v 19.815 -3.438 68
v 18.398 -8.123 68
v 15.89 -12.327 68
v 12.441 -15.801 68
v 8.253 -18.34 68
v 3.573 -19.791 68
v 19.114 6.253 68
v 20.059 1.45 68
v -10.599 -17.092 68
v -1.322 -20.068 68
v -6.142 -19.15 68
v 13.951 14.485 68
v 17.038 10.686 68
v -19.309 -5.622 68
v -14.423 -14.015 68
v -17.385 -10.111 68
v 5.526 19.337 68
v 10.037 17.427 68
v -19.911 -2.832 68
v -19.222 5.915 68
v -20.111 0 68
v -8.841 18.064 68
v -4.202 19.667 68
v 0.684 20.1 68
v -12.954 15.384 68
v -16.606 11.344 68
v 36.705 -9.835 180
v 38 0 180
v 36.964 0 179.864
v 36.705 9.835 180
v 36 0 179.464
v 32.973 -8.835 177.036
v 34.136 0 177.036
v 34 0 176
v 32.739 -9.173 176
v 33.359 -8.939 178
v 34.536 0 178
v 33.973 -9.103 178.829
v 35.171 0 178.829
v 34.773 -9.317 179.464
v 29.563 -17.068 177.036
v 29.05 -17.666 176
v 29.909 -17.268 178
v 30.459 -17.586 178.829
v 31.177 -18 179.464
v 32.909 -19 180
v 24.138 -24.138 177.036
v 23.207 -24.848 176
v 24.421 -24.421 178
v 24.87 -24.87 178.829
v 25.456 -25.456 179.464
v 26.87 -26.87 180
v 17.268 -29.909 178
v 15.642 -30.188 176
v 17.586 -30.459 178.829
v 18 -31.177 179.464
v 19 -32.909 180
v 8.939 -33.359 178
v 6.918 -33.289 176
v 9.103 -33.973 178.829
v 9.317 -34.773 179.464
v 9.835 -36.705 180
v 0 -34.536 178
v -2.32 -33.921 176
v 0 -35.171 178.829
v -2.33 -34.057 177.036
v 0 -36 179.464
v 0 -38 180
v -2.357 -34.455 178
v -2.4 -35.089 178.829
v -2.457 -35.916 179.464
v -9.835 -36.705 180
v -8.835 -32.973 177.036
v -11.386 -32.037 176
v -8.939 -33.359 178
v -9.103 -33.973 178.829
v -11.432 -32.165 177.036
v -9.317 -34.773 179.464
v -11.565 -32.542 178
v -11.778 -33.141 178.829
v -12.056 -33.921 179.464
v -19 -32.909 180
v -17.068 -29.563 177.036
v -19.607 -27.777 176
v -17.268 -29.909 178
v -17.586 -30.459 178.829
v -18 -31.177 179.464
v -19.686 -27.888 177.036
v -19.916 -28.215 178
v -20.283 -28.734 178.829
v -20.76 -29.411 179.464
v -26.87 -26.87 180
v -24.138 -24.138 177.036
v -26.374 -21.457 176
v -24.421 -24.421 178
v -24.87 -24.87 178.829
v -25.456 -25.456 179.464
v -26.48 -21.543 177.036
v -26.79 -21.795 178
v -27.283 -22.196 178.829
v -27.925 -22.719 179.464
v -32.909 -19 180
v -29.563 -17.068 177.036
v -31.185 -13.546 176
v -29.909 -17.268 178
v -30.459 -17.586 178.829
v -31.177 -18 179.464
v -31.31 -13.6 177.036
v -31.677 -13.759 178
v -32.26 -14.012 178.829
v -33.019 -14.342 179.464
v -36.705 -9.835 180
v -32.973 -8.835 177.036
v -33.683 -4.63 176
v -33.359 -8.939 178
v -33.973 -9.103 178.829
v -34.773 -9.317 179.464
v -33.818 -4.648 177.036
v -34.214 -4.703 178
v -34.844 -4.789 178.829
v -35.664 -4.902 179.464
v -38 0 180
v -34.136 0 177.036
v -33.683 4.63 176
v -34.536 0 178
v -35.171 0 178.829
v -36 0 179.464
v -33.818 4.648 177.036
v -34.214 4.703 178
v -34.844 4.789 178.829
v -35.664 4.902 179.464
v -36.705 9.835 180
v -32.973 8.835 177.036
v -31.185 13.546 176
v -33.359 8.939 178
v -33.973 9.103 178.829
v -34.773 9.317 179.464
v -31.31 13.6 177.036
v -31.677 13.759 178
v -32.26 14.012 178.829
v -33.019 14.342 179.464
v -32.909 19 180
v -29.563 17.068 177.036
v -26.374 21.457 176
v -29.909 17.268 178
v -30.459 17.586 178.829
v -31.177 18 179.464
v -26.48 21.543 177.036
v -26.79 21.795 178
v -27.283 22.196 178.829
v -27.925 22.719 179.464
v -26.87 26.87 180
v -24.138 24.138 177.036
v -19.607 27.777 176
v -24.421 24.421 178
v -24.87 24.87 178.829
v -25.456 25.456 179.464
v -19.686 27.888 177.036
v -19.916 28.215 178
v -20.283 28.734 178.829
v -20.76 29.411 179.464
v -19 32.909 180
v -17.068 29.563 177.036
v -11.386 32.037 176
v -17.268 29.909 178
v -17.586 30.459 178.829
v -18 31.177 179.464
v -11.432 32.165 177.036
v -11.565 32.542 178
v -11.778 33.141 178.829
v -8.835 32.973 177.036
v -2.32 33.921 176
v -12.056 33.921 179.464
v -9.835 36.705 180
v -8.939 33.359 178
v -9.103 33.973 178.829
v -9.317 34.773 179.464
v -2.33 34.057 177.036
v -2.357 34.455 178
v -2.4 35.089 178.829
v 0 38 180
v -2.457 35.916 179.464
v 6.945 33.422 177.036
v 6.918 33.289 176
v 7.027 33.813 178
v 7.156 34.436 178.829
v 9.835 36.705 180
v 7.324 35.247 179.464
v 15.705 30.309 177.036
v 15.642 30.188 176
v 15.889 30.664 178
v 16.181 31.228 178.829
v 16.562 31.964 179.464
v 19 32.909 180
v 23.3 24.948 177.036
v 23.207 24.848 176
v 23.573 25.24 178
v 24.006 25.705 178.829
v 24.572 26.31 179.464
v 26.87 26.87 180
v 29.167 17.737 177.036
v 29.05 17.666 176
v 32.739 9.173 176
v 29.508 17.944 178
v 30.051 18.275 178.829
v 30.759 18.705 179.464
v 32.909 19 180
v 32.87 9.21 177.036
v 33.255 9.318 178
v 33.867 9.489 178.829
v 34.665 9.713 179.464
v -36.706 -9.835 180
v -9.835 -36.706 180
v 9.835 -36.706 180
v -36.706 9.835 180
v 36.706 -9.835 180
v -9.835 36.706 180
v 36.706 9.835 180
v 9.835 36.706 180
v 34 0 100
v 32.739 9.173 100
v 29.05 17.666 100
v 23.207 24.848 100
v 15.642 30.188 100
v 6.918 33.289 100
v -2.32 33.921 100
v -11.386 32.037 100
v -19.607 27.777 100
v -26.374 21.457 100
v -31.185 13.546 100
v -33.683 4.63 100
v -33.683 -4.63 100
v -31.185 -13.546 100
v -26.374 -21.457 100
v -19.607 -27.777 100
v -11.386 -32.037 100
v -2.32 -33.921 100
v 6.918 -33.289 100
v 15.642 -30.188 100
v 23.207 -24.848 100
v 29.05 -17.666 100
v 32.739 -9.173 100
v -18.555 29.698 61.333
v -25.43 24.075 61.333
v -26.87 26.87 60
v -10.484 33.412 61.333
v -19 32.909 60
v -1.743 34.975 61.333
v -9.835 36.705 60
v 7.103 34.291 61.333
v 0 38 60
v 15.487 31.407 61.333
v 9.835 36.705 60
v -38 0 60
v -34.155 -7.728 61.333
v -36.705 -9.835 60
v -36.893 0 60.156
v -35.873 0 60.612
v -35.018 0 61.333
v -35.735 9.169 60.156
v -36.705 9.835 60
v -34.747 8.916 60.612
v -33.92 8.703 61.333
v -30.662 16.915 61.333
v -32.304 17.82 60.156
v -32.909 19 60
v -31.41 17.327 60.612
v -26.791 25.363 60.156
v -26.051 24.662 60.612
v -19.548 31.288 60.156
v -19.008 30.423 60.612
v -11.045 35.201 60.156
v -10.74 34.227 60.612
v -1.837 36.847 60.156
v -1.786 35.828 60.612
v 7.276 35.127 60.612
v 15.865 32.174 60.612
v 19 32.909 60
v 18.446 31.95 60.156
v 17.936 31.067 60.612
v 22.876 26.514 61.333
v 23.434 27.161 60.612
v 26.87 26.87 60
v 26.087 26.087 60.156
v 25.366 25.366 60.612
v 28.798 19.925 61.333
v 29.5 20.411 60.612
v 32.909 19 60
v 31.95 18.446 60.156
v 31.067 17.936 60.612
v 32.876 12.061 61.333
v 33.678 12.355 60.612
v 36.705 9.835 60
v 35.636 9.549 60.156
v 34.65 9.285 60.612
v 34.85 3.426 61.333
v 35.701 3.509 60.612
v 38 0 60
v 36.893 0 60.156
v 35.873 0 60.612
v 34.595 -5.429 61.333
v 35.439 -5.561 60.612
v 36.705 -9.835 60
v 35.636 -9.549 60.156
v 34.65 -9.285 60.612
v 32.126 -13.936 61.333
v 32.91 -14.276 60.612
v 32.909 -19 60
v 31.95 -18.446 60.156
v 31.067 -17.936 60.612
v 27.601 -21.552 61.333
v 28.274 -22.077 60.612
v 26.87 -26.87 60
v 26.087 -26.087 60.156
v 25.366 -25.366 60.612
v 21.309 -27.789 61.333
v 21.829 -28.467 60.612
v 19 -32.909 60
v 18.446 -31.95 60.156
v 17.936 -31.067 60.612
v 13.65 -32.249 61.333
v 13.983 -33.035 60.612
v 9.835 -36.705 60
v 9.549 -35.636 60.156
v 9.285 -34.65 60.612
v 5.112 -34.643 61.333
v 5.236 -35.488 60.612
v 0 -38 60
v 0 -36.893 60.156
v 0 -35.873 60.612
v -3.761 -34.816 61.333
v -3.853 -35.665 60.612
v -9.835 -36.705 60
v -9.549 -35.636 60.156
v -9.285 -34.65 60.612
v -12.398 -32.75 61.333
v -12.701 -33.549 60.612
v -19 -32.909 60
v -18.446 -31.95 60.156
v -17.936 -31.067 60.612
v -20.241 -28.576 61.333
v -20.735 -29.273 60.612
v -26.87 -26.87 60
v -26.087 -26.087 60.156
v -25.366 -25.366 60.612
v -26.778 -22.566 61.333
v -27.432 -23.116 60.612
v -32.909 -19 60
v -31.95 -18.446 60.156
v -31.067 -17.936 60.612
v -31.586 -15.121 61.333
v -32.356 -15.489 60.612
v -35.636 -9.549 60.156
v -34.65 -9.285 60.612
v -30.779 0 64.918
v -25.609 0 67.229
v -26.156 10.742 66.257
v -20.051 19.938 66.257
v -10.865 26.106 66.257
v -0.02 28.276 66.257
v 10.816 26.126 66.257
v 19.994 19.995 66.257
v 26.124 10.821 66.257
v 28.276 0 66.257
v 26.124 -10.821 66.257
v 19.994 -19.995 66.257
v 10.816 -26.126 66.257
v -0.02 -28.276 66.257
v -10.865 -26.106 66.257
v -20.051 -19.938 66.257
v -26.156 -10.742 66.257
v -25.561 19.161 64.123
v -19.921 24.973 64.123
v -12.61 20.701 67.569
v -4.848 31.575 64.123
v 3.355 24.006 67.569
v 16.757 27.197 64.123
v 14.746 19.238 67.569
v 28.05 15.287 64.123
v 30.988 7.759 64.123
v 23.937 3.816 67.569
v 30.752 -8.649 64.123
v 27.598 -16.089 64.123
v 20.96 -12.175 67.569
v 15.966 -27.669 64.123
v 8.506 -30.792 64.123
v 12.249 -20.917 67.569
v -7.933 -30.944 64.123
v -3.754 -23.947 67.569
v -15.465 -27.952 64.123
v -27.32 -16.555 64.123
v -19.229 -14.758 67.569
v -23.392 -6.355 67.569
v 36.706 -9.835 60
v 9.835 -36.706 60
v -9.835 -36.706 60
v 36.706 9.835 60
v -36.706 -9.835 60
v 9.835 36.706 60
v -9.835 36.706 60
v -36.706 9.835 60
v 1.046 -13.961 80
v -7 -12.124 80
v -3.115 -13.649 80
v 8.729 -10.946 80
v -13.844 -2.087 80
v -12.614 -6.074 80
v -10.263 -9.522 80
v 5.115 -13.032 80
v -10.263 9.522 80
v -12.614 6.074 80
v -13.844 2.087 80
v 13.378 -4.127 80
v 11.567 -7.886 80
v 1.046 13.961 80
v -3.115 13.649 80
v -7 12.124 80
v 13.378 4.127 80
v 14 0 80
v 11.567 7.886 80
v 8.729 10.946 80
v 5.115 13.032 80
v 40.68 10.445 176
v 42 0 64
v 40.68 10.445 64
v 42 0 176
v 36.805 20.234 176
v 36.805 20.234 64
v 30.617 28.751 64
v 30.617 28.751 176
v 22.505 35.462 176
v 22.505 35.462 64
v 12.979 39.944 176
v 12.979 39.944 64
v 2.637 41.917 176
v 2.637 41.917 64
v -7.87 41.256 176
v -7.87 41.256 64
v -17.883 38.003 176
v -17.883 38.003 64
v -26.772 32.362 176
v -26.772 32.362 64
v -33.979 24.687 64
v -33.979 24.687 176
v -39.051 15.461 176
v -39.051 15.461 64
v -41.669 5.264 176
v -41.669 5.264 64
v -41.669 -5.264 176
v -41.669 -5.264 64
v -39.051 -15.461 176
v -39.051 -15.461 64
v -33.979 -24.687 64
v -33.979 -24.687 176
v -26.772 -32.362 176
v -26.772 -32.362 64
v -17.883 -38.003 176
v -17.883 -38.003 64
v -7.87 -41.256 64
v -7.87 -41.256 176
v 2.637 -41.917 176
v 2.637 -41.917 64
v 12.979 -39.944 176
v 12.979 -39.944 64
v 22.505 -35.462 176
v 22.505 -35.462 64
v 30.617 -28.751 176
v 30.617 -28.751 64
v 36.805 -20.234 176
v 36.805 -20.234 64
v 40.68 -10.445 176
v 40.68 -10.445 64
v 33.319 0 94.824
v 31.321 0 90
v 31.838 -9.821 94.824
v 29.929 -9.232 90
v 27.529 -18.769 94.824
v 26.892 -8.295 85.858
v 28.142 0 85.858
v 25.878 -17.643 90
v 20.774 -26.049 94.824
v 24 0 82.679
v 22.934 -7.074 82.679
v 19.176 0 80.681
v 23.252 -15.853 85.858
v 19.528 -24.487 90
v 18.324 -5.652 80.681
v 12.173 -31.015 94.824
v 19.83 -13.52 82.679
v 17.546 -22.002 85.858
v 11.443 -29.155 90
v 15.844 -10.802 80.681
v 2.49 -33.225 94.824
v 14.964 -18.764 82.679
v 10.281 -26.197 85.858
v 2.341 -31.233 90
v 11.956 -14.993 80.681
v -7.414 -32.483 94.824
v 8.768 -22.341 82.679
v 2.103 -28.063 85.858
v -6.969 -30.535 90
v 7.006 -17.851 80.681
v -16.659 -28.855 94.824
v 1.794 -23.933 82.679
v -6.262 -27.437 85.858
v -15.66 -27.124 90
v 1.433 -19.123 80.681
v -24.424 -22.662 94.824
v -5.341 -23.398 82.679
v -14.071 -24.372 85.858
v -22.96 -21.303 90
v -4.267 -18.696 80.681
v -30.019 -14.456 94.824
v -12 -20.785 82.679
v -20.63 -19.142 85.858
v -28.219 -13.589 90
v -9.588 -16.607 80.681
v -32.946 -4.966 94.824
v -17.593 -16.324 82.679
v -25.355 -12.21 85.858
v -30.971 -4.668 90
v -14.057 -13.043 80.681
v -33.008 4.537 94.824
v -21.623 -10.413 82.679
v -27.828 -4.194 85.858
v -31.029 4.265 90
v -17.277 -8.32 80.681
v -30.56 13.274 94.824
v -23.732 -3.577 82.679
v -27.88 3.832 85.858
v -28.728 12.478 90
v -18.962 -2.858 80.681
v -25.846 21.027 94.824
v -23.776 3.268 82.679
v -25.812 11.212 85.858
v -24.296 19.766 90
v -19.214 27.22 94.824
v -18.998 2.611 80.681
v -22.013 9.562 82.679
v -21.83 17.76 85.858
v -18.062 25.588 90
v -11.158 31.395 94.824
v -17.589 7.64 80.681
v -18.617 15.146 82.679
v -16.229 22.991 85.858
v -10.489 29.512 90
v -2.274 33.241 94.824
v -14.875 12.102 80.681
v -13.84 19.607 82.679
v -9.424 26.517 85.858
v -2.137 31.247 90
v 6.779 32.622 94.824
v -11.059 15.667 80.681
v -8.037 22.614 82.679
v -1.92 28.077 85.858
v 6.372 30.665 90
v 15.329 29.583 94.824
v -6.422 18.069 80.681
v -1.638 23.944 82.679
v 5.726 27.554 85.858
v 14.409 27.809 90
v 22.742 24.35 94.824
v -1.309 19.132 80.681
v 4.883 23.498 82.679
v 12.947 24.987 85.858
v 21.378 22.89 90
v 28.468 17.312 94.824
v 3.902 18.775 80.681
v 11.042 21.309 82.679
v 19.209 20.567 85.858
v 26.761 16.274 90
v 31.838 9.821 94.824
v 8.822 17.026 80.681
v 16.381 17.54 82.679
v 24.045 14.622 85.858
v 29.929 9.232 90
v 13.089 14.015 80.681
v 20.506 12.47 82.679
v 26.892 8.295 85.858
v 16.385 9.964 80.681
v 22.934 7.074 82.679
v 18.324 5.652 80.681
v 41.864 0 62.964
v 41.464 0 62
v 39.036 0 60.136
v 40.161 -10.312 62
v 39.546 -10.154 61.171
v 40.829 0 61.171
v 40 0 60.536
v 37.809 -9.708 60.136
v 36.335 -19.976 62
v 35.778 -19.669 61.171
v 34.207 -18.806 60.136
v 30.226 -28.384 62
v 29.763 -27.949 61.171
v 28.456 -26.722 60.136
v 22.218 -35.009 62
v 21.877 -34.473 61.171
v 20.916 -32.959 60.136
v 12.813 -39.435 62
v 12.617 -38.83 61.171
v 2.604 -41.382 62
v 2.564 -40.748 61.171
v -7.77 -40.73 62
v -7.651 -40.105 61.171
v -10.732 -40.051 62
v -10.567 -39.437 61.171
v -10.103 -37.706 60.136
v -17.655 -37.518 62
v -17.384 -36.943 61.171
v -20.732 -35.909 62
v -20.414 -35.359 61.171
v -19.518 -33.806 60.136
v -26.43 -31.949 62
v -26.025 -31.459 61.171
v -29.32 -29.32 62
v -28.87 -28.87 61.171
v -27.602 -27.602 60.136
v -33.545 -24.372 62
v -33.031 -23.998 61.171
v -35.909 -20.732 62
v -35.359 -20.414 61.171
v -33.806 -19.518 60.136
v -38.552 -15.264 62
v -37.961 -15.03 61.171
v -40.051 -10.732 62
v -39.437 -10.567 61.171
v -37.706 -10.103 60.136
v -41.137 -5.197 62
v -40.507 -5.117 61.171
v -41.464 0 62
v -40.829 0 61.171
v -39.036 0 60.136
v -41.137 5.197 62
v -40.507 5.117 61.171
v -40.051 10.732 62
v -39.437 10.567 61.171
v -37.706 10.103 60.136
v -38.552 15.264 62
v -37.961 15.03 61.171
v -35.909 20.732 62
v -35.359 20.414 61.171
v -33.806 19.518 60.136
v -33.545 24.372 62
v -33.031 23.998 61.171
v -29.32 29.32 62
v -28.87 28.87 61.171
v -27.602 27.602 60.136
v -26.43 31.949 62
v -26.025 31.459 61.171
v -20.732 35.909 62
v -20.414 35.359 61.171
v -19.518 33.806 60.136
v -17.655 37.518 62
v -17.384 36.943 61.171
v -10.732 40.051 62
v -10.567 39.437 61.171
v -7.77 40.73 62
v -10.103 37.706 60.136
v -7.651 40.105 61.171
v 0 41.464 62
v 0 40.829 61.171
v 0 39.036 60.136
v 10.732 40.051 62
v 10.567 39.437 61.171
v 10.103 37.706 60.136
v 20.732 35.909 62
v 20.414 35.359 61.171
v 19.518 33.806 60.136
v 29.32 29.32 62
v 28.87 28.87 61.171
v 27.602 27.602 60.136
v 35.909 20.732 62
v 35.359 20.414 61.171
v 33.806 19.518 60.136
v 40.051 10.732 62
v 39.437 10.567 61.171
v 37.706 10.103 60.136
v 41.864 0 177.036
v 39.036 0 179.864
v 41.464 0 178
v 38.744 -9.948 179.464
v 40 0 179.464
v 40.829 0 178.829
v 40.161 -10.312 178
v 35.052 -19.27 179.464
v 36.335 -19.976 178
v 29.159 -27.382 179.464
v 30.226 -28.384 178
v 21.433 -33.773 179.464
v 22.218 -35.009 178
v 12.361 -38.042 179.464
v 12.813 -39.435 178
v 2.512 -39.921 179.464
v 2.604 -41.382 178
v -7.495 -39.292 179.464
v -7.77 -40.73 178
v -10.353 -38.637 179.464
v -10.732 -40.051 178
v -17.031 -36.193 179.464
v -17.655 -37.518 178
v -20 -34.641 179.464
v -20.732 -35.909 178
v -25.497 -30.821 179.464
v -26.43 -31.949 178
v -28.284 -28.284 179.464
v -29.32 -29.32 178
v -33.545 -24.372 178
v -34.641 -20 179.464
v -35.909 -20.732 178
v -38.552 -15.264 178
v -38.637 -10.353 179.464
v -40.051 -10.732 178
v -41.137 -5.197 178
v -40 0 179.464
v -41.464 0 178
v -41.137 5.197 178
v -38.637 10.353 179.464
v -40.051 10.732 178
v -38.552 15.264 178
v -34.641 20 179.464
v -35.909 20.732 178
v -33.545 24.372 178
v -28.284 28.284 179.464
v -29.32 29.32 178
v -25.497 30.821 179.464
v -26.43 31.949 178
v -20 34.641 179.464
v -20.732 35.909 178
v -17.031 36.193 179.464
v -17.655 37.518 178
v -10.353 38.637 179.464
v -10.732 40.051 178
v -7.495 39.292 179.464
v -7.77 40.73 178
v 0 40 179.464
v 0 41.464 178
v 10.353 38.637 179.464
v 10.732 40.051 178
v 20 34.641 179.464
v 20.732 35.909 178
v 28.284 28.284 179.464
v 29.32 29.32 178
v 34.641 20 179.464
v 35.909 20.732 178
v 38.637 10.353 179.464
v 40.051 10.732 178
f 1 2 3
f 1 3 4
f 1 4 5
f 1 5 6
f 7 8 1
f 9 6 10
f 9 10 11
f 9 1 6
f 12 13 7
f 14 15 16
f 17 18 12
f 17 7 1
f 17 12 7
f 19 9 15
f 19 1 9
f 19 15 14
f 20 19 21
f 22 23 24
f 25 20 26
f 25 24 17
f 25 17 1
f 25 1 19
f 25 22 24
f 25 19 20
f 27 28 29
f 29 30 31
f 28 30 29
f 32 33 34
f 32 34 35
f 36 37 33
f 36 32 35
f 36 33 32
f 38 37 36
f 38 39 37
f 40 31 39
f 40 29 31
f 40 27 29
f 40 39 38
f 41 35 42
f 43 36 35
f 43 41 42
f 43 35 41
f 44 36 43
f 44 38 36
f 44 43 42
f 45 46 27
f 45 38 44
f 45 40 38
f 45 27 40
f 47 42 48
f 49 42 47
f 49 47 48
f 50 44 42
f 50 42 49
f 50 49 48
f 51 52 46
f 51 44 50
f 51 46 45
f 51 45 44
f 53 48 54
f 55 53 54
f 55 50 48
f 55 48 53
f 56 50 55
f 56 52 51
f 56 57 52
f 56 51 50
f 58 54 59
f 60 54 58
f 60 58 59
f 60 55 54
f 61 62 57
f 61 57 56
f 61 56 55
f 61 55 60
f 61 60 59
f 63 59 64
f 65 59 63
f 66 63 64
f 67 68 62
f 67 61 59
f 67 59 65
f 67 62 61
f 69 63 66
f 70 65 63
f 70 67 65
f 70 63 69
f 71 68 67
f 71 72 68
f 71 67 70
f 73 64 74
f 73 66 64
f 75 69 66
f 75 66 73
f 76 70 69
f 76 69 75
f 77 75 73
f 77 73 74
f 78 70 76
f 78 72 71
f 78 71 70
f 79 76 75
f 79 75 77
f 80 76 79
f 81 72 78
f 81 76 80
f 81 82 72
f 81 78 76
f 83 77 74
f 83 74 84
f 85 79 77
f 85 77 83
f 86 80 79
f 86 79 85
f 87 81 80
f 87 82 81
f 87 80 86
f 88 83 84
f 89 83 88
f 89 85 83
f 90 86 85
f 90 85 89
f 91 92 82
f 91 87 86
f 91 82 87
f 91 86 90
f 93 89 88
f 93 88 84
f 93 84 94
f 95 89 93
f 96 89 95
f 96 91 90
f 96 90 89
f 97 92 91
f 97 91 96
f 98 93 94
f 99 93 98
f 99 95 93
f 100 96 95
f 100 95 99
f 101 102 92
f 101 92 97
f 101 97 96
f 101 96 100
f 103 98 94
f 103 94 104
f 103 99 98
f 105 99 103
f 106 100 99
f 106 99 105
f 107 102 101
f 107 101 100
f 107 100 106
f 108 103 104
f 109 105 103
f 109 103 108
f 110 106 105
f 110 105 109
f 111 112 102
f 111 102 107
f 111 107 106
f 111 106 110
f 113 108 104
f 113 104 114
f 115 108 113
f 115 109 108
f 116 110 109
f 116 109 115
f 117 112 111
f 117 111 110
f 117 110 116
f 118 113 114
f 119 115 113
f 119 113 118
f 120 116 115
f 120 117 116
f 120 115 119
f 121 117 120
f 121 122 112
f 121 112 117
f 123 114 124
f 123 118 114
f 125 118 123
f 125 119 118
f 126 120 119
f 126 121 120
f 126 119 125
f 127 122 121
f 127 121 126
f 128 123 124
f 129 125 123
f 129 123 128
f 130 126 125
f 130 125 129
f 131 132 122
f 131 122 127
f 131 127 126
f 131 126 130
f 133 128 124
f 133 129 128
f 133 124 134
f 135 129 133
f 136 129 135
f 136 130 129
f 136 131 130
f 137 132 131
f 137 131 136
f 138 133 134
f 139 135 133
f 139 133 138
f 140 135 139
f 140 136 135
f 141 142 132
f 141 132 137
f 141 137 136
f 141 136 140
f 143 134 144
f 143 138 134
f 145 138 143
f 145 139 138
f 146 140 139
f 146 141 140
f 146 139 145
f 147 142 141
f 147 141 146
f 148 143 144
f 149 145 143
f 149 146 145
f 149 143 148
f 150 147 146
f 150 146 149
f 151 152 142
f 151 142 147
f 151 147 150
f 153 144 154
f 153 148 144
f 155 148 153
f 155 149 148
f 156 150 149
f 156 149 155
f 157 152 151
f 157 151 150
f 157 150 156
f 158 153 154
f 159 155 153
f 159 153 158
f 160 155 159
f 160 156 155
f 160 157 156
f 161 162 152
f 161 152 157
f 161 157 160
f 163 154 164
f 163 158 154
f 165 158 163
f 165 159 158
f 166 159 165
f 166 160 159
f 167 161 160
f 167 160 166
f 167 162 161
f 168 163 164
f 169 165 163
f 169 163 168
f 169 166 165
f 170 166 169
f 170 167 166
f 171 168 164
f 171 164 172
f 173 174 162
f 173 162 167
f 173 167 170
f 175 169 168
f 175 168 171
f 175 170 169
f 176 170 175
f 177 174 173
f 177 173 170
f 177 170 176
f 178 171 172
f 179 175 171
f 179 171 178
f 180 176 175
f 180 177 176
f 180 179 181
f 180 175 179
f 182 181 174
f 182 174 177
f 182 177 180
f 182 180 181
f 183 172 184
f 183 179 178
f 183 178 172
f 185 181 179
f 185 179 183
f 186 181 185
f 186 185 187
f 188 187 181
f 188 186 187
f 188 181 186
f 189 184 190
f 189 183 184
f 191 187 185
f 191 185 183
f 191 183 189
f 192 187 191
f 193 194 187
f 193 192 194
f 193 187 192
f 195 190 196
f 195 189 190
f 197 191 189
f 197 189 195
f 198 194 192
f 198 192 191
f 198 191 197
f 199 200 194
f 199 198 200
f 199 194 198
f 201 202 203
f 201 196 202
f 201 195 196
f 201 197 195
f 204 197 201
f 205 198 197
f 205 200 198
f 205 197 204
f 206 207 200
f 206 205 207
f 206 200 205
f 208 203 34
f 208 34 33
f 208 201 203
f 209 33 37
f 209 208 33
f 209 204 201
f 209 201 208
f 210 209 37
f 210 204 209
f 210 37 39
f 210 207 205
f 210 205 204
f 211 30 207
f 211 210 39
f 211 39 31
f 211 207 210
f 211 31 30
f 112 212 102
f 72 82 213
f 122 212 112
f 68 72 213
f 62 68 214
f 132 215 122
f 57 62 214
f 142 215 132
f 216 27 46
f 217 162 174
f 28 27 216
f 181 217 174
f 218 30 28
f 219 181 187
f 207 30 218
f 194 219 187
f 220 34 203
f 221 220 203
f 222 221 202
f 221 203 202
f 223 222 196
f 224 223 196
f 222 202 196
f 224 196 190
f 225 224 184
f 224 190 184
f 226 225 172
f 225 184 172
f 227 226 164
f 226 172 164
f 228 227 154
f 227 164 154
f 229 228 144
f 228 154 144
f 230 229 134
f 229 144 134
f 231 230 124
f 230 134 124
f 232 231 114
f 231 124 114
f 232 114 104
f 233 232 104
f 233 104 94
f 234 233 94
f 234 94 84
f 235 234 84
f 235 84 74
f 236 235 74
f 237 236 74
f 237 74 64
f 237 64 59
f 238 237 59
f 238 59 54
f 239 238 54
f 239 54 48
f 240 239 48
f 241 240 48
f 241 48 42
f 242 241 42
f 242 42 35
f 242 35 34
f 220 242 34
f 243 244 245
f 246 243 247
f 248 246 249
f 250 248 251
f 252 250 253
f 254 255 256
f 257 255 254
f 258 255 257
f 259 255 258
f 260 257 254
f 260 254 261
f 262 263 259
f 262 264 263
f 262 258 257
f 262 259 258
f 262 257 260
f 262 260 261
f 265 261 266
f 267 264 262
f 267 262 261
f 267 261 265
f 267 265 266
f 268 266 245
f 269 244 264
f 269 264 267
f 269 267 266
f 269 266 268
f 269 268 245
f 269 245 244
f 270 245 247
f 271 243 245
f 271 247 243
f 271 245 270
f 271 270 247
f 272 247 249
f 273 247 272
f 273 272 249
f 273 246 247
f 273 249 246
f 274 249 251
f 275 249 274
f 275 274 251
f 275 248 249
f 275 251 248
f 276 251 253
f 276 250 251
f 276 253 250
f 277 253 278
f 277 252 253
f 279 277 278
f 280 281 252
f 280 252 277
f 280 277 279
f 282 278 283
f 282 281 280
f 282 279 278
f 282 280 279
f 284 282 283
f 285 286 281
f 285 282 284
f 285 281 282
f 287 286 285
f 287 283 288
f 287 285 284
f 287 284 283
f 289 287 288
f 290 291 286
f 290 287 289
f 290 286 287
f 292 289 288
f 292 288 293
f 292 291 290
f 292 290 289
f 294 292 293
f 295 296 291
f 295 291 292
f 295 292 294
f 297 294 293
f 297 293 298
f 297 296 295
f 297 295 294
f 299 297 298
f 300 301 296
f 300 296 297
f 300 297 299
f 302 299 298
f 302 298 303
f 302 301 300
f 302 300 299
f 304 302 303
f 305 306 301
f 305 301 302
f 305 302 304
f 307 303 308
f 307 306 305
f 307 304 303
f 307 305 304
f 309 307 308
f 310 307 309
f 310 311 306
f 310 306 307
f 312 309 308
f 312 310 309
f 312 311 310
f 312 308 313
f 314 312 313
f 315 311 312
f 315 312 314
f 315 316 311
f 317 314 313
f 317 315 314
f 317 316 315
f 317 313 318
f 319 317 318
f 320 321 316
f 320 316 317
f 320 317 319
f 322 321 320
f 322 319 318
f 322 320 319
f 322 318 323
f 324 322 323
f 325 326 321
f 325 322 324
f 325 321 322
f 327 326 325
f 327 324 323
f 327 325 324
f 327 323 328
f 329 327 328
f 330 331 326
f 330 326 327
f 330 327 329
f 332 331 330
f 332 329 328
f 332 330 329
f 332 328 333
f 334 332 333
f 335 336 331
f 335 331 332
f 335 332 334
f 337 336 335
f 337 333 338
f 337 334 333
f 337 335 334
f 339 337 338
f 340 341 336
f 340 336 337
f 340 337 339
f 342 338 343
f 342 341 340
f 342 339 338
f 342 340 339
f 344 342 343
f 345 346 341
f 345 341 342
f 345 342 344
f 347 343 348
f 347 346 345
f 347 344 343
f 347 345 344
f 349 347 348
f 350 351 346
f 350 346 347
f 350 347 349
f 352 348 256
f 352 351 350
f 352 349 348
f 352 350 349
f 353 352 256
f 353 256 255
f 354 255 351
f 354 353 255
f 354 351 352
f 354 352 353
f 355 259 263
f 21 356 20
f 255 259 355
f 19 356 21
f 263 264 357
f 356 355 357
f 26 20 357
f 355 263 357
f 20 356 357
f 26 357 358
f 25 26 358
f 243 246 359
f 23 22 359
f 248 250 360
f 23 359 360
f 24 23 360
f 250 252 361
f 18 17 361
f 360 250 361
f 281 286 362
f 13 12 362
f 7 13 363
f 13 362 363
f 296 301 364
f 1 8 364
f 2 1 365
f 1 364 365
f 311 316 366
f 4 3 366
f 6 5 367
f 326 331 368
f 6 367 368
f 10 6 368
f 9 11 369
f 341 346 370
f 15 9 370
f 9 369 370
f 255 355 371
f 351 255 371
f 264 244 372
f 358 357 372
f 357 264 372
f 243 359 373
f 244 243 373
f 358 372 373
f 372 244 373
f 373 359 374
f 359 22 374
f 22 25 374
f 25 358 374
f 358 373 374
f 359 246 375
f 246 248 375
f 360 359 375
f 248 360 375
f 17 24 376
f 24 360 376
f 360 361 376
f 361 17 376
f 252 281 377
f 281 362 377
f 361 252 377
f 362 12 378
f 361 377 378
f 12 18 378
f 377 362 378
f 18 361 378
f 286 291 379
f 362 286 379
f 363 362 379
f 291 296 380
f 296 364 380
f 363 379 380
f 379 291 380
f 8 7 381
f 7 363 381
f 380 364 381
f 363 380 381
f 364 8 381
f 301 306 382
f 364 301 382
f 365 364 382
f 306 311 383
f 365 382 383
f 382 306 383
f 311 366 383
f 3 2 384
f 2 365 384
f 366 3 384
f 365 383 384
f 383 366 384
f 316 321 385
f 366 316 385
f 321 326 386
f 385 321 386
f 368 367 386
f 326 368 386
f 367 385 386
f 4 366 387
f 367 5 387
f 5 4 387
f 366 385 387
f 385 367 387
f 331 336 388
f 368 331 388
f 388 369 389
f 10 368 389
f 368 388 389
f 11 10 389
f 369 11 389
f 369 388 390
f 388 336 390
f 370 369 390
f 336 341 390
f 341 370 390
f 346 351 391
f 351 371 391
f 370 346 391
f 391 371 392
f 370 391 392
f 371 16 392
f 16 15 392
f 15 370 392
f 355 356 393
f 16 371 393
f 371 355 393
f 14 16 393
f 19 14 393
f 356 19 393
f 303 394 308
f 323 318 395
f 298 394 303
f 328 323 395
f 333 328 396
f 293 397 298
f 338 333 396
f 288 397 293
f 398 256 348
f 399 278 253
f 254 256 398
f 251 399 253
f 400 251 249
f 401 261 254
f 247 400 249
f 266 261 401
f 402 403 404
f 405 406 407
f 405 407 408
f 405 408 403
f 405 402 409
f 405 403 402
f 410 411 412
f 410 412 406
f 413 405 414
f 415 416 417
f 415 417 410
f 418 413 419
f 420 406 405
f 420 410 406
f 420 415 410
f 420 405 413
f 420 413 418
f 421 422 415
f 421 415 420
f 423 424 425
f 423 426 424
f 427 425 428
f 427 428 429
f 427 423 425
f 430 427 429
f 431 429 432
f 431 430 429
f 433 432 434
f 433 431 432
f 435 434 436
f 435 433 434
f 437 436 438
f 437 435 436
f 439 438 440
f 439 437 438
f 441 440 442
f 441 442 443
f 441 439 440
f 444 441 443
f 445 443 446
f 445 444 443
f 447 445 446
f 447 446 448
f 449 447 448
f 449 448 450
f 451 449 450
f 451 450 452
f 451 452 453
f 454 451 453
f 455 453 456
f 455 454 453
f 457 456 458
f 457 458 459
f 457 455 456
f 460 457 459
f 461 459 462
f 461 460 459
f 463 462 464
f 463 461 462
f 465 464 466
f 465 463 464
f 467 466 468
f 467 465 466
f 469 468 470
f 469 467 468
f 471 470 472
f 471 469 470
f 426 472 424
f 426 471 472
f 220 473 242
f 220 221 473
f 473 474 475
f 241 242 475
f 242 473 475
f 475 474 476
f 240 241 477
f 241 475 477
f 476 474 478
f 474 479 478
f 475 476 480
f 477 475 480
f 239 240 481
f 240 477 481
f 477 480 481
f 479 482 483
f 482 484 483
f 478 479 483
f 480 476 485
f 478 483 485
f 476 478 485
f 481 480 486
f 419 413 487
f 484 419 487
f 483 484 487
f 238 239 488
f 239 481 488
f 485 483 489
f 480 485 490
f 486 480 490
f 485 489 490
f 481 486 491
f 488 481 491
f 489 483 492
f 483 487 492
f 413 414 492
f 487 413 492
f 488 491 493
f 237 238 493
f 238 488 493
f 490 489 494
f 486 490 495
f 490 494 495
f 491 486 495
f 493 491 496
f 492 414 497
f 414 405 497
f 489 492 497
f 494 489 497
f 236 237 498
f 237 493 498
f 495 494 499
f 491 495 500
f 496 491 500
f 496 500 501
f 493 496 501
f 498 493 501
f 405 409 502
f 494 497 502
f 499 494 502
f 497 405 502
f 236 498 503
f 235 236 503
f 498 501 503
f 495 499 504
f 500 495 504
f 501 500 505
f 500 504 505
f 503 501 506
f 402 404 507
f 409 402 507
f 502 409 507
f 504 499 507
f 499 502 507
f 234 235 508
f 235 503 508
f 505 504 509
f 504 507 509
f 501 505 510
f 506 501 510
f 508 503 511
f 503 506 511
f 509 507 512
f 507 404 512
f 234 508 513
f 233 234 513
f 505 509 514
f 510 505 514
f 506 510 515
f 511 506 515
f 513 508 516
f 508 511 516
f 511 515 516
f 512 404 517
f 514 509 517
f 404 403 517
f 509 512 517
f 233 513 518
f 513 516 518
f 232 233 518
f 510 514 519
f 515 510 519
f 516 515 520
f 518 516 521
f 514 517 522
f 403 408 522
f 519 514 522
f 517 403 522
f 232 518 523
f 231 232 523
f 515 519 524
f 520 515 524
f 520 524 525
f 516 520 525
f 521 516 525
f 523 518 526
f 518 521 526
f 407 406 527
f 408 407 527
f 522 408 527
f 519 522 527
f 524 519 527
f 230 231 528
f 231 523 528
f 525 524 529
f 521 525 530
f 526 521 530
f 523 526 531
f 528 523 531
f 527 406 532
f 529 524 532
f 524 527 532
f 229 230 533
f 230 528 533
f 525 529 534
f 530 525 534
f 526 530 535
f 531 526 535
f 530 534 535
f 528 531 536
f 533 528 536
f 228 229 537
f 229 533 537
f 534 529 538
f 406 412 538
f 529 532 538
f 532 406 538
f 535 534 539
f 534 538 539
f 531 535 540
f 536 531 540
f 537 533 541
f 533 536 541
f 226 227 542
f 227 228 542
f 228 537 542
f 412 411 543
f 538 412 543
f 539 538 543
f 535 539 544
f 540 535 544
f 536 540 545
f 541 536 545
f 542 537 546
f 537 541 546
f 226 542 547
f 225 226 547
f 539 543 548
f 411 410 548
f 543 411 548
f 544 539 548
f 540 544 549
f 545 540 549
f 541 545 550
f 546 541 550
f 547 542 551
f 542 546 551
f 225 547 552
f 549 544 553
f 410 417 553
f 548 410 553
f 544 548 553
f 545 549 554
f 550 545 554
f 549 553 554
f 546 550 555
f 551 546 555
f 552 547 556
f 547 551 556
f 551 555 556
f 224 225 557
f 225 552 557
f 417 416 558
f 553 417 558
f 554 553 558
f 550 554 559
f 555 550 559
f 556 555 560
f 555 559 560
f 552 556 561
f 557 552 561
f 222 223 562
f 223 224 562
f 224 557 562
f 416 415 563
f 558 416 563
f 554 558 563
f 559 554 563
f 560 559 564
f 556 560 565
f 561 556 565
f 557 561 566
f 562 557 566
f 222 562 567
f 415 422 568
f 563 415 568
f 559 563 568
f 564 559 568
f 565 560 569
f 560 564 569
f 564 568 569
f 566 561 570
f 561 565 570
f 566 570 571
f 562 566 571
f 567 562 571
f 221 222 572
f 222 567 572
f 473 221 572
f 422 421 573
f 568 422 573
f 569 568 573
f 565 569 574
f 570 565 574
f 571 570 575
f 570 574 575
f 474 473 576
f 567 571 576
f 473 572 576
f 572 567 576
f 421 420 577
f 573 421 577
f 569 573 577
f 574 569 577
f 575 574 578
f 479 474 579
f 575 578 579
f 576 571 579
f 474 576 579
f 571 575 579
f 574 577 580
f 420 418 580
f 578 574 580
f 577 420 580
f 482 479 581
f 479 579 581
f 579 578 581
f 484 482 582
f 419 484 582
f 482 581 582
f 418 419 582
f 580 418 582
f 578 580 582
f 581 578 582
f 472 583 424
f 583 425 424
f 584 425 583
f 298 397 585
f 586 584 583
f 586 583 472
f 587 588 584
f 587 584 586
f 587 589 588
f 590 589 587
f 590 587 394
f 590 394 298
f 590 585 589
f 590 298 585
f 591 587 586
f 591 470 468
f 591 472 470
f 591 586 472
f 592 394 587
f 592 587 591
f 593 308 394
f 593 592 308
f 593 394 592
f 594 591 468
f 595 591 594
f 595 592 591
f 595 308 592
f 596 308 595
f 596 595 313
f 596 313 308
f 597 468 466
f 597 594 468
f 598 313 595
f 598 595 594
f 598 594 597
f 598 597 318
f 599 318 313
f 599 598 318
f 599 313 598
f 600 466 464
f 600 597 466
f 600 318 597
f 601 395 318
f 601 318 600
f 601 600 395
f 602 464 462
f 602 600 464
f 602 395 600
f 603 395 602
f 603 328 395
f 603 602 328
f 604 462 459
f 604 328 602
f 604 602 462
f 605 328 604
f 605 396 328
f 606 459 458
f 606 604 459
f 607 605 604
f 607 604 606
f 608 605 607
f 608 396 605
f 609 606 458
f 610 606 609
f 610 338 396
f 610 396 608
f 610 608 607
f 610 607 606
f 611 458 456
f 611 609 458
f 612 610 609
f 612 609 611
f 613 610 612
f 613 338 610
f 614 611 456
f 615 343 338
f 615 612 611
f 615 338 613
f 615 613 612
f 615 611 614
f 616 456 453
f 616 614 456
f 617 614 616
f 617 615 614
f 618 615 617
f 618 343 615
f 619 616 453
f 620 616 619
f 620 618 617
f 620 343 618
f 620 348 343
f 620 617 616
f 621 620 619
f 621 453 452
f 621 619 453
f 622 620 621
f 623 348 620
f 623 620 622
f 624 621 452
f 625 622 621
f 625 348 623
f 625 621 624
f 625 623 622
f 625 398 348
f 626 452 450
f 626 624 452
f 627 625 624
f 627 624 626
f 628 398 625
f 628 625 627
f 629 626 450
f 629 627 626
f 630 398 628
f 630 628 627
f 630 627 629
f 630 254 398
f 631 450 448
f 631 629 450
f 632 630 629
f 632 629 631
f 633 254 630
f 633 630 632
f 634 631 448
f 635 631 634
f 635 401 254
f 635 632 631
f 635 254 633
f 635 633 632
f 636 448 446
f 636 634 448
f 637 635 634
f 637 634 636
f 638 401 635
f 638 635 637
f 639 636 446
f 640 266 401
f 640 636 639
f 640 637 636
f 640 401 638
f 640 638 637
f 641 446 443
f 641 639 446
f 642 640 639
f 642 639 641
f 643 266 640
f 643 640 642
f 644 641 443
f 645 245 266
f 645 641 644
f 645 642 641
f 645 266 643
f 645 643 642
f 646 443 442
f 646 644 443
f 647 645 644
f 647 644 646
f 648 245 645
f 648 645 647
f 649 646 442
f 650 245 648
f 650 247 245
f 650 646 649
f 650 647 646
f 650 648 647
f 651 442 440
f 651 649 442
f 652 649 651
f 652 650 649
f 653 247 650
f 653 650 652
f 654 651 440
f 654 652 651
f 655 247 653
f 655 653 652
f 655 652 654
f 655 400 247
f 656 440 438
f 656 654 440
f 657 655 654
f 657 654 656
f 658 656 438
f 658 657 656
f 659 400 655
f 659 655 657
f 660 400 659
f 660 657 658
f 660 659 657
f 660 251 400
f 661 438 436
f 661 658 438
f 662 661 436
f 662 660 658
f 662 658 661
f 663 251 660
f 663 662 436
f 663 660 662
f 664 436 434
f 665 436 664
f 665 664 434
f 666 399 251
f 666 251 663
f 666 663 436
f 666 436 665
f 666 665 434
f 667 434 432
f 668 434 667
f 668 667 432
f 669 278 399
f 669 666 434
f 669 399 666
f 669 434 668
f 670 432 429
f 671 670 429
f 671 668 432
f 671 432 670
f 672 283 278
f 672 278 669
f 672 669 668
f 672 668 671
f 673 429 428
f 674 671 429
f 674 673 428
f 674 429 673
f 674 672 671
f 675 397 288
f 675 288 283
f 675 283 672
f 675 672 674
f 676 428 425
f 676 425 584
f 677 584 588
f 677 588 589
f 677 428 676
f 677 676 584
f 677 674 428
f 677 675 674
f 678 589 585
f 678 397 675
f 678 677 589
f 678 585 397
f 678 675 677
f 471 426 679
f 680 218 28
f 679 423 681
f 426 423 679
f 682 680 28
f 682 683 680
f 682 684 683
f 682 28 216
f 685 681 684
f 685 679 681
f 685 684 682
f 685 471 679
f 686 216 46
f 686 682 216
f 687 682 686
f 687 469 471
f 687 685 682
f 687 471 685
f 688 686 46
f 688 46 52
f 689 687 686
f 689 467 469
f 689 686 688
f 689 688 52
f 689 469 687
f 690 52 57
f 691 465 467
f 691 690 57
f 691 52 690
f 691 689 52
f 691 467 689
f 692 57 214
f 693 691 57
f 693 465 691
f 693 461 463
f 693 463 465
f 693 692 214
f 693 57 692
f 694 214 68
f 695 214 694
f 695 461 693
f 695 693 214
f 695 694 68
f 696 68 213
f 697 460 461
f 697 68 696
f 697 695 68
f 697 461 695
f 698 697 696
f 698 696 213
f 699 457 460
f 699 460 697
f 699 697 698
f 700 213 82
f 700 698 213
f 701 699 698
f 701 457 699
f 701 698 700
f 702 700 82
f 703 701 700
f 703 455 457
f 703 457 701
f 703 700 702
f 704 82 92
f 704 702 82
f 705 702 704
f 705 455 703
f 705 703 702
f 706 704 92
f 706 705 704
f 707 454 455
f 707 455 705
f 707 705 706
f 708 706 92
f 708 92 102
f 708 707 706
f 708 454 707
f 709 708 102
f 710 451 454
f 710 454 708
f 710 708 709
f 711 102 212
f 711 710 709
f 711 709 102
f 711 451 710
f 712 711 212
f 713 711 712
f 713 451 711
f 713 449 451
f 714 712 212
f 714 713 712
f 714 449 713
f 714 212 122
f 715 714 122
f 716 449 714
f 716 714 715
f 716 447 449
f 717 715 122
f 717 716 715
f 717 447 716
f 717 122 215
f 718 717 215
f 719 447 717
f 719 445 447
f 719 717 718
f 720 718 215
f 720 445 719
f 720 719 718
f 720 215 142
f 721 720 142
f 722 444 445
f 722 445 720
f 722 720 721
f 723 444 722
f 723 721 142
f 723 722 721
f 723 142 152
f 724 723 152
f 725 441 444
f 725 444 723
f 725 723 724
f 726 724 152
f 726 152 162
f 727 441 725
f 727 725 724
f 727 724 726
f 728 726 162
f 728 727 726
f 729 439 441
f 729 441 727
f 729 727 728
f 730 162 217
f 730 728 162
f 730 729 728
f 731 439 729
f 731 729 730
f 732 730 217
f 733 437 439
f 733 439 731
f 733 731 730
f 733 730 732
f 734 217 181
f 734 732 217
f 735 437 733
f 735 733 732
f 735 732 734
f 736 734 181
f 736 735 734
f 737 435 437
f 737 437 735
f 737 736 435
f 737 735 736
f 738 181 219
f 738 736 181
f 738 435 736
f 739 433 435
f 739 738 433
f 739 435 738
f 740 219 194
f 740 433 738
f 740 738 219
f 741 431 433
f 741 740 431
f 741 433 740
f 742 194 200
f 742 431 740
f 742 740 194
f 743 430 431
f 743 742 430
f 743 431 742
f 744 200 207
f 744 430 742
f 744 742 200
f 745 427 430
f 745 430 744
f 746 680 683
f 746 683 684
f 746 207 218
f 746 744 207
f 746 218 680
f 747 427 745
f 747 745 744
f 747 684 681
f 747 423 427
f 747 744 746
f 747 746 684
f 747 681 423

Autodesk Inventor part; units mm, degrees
ref_plane "YZ Plane" through (0, 0, 0) normal (1, 0, 0) x (0, 1, 0)
ref_plane "XZ Plane" through (0, 0, 0) normal (0, 1, 0) x (-1, 0, 0)
ref_plane "XY Plane" through (0, 0, 0) normal (0, 0, 1) x (1, 0, 0)
sketch "スケッチ1" plane through (0, 0, 0) normal (0, 0, 1) x (1, 0, 0)
  line L0 (-45, 45) -> (45, 45)
  line L1 (45, 45) -> (45, -45)
  line L2 (45, -45) -> (-45, -45)
  line L3 (-45, -45) -> (-45, 45)
  point P0 (0, 0)
  point P1 (0, 45)
  point P2 (-45, 0)
  dimension "d0" = 90
  dimension "d1" = 90
extrude "押し出し1" add sketch "スケッチ1" along normal blind 180
sketch "スケッチ2" plane through (0, 0, 180) normal (0, 0, 1) x (1, 0, 0)
  point P0 (0, 0)
sketch "スケッチ3" plane through (0, 0, 180) normal (0, 0, 1) x (1, 0, 0)
  circle A0 centre (0, 0) radius 42
  dimension "d4" = 84
extrude "押し出し2" cut sketch "スケッチ3" against normal through all keep common part
sketch "スケッチ4" plane through (0, 0, 180) normal (0, 0, 1) x (1, 0, 0)
  circle A0 centre (0, 0) radius 34
  circle A1 centre (0, 0) radius 42 construction
  dimension "d7" = 8
extrude "押し出し3" cut sketch "スケッチ4" against normal blind 100
sketch "スケッチ5" plane through (0, 0, 0) normal (0, 0, -1) x (-1, 0, 0)
  circle A0 centre (0, 0) radius 42 projected
extrude "押し出し4" cut sketch "スケッチ5" against normal blind 60
fillet "フィレット1" radius 20 1 edges at (-34, 0, 80)
sketch "スケッチ6" plane through (0, 0, 60) normal (0, 0, -1) x (-1, 0, 0)
  circle A0 centre (0, 0) radius 34 projected
extrude "押し出し5" cut sketch "スケッチ6" against normal blind 8
fillet "フィレット2" radius 4 4 edges at (-42, 0, 180) (-34, 0, 180) (-42, 0, 60) (34, 0, 60)
fillet "フィレット3" radius 20 1 edges at (34, 0, 68)
equation "\"d1\" = d0"
properties part number "cup" material "アルミニウム 6061"
